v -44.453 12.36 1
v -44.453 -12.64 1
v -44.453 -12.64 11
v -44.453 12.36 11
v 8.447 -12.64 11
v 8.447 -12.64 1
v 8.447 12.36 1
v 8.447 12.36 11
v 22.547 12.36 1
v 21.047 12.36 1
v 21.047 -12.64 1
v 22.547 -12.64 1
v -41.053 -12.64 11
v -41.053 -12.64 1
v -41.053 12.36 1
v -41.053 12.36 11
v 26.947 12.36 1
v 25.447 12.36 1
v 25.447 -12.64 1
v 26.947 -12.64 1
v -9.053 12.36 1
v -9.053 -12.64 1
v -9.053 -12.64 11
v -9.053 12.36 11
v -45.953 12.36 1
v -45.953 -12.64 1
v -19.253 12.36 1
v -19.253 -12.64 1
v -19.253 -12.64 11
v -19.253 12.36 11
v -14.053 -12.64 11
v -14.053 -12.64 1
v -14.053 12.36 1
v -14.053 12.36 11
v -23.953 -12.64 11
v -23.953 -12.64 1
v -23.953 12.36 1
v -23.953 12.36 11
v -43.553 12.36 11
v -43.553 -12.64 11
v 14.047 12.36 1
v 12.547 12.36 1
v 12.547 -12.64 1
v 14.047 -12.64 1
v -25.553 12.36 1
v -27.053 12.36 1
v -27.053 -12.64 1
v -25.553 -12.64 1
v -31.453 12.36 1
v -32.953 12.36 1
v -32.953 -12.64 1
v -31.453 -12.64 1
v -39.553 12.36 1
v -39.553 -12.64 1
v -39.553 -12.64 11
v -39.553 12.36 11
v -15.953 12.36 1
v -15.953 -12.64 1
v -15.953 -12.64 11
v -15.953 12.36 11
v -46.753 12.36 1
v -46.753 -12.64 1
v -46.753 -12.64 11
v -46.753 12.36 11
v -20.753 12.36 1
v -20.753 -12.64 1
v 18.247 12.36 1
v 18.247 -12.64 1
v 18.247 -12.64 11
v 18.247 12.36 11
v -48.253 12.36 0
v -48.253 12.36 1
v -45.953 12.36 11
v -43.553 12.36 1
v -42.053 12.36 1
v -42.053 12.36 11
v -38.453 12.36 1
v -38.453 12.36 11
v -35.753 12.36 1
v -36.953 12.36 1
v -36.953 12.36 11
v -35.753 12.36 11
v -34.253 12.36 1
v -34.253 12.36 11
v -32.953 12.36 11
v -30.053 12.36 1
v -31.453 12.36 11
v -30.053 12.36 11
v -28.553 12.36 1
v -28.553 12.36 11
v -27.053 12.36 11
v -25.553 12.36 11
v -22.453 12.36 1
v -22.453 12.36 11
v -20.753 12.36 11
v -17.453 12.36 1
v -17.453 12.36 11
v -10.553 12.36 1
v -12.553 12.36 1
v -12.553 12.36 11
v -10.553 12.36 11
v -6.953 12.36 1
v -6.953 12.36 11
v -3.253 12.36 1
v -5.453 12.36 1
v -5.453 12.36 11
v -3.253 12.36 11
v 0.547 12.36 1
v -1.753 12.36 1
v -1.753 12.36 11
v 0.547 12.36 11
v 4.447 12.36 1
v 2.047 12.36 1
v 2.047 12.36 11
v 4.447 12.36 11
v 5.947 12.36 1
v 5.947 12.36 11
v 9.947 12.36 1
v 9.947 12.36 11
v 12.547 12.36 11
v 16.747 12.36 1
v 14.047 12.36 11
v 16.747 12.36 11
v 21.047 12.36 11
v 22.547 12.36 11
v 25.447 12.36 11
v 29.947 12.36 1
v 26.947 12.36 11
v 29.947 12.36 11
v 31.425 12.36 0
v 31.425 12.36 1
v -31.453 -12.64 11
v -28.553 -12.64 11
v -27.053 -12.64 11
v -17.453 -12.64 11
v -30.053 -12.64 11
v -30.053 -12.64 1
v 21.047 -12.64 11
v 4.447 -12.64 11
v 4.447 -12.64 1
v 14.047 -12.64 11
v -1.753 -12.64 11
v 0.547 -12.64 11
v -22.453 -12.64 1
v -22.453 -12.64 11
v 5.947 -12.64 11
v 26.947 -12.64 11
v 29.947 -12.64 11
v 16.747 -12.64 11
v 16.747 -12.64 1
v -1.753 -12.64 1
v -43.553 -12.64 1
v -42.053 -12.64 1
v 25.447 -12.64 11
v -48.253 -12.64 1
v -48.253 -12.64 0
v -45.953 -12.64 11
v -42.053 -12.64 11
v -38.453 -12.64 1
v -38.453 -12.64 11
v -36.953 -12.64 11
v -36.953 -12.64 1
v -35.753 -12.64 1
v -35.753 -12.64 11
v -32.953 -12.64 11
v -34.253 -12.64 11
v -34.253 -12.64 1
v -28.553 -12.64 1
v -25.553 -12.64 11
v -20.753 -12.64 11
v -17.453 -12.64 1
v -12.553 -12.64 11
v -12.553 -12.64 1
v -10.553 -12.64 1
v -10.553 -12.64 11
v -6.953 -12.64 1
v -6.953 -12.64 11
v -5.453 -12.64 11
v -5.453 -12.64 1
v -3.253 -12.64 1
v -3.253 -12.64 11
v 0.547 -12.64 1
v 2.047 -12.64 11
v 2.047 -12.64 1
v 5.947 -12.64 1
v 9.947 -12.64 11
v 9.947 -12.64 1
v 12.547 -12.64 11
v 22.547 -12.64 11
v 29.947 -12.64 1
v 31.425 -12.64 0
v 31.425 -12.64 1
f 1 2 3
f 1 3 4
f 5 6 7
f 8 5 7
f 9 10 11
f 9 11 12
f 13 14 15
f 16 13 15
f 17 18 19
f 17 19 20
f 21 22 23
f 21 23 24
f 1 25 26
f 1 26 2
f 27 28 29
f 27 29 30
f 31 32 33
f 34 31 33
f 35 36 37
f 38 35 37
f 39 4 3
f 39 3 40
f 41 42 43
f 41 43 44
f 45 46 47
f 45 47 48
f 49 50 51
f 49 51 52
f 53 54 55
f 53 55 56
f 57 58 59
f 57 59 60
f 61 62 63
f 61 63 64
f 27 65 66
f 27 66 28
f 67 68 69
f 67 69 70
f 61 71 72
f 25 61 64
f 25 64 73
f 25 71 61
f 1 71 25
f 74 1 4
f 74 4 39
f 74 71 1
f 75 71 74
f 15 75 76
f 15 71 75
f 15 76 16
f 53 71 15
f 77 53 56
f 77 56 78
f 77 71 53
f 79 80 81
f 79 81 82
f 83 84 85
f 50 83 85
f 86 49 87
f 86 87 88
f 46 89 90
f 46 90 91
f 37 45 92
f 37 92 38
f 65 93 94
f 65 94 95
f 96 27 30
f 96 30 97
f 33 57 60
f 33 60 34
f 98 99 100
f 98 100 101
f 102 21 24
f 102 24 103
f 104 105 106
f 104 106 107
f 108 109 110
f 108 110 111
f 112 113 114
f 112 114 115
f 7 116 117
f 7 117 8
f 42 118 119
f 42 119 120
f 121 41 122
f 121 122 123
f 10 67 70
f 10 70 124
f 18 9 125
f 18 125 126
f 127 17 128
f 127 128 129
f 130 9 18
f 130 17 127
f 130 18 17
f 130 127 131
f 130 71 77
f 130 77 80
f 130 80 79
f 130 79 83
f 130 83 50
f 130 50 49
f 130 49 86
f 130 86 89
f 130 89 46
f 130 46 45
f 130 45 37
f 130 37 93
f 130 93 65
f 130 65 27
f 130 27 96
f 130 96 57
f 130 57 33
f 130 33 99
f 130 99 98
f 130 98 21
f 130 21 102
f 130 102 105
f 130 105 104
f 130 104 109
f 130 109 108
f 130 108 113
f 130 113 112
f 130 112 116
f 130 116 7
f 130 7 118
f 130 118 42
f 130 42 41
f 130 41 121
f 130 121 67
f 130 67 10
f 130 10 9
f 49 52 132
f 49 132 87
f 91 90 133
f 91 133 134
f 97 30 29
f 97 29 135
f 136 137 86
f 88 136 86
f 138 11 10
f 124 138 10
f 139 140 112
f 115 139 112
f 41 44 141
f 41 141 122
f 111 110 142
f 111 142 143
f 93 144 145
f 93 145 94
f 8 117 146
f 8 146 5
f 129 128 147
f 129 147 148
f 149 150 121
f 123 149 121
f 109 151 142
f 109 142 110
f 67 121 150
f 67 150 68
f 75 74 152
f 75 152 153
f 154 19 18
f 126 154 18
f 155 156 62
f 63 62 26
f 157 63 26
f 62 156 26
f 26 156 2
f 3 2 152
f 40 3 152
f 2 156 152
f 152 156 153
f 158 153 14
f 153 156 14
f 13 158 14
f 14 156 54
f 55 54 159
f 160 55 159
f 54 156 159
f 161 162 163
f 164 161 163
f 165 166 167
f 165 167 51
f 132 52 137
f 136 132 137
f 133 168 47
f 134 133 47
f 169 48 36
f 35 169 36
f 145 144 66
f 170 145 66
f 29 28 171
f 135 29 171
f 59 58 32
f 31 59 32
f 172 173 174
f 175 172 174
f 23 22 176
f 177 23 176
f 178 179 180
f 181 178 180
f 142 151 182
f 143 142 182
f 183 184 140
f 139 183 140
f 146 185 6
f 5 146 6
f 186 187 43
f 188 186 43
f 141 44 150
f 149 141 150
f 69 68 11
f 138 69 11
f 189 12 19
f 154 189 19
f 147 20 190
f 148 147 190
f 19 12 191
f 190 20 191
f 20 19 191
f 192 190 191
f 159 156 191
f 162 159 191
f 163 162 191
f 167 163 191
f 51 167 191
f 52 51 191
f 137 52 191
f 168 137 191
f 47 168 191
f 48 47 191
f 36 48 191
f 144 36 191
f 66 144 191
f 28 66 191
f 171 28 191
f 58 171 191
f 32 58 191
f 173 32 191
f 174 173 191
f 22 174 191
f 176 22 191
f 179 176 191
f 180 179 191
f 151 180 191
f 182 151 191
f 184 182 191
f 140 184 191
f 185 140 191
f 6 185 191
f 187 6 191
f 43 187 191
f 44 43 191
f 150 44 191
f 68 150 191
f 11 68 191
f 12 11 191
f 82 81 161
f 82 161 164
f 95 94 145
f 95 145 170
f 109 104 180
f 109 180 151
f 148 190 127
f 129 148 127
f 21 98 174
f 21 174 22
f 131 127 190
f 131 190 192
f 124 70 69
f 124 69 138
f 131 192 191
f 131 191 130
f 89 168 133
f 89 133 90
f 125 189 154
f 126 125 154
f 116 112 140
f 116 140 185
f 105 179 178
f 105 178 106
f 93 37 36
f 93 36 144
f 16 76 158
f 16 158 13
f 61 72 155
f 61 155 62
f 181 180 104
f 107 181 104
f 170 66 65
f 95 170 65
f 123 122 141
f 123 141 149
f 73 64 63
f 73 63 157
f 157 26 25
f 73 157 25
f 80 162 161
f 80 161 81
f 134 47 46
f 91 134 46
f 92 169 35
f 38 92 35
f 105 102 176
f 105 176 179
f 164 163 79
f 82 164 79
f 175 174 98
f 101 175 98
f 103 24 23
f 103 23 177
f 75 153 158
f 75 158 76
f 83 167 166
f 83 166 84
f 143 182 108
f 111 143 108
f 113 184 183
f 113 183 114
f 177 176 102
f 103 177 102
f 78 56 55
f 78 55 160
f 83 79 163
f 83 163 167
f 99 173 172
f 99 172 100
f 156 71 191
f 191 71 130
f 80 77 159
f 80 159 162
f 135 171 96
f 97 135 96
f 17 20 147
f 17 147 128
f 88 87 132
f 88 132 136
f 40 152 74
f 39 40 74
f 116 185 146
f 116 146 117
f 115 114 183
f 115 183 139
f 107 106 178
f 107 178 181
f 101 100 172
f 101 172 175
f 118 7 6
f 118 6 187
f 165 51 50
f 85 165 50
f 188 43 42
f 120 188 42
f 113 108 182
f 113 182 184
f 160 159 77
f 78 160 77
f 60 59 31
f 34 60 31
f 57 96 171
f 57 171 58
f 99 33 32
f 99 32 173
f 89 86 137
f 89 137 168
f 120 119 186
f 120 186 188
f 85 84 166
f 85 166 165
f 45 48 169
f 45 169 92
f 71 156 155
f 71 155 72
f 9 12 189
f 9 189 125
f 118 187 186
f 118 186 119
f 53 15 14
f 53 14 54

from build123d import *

# Parameters (mm, degrees)
F0_W     = 100
F0_H     = 25
F1_DEPTH = 1
F2_W     = 0.8
F2_H     = 25
F2_W_2   = 0.9
F2_W_3   = 1
F2_W_4   = 1.1
F2_W_5   = 1.2
F2_W_6   = 1.3
F2_W_7   = 1.4
F2_W_8   = 1.5
F2_W_9   = 1.6
F2_W_10  = 1.7
F2_W_11  = 1.8
F2_W_12  = 1.9
F2_W_13  = 2
F2_W_14  = 2.1
F2_W_15  = 2.2
F2_W_16  = 2.3
F2_W_17  = 2.4
F2_W_18  = 2.5
F2_W_19  = 2.6
F2_W_20  = 2.7
F2_W_21  = 2.8
F2_W_22  = 2.9
F2_W_23  = 3
F3_DEPTH = 10
F4_W     = 23.160562
F4_H     = 27.70046
F5_DEPTH = 25


with BuildPart() as f1:
    # F0 (on Top) → F1 (new body)
    with BuildSketch(Plane.XY):
        with Locations((1.74681, -0.140128)):
            Rectangle(F0_W, F0_H)
    extrude(amount=F1_DEPTH)

    # F2 (on face) → F3 (join)
    with BuildSketch(Plane.XY.offset(1)):
        with Locations((-46.35319, -0.140128)):
            Rectangle(F2_W, F2_H)
        with Locations((-44.00319, -0.140128)):
            Rectangle(F2_W_2, F2_H)
        with Locations((-41.55319, -0.140128)):
            Rectangle(F2_W_3, F2_H)
        with Locations((-39.00319, -0.140128)):
            Rectangle(F2_W_4, F2_H)
        with Locations((-36.35319, -0.140128)):
            Rectangle(F2_W_5, F2_H)
        with Locations((-33.60319, -0.140128)):
            Rectangle(F2_W_6, F2_H)
        with Locations((-30.75319, -0.140128)):
            Rectangle(F2_W_7, F2_H)
        with Locations((-27.80319, -0.140128)):
            Rectangle(F2_W_8, F2_H)
        with Locations((-24.75319, -0.140128)):
            Rectangle(F2_W_9, F2_H)
        with Locations((-21.60319, -0.140128)):
            Rectangle(F2_W_10, F2_H)
        with Locations((-18.35319, -0.140128)):
            Rectangle(F2_W_11, F2_H)
        with Locations((-15.00319, -0.140128)):
            Rectangle(F2_W_12, F2_H)
        with Locations((-11.55319, -0.140128)):
            Rectangle(F2_W_13, F2_H)
        with Locations((-8.00319, -0.140128)):
            Rectangle(F2_W_14, F2_H)
        with Locations((-4.35319, -0.140128)):
            Rectangle(F2_W_15, F2_H)
        with Locations((-0.60319, -0.140128)):
            Rectangle(F2_W_16, F2_H)
        with Locations((3.24681, -0.140128)):
            Rectangle(F2_W_17, F2_H)
        with Locations((7.19681, -0.140128)):
            Rectangle(F2_W_18, F2_H)
        with Locations((11.24681, -0.140128)):
            Rectangle(F2_W_19, F2_H)
        with Locations((15.39681, -0.140128)):
            Rectangle(F2_W_20, F2_H)
        with Locations((19.64681, -0.140128)):
            Rectangle(F2_W_21, F2_H)
        with Locations((23.99681, -0.140128)):
            Rectangle(F2_W_22, F2_H)
        with Locations((28.44681, -0.140128)):
            Rectangle(F2_W_23, F2_H)
    extrude(amount=F3_DEPTH)

    # F4 (on face) → F5 (cut)
    with BuildSketch(Plane.XY.offset(1)):
        with Locations((43.004874, -0.135502)):
            Rectangle(F4_W, F4_H)
    extrude(amount=-F5_DEPTH, mode=Mode.SUBTRACT)


solid = f1.part
